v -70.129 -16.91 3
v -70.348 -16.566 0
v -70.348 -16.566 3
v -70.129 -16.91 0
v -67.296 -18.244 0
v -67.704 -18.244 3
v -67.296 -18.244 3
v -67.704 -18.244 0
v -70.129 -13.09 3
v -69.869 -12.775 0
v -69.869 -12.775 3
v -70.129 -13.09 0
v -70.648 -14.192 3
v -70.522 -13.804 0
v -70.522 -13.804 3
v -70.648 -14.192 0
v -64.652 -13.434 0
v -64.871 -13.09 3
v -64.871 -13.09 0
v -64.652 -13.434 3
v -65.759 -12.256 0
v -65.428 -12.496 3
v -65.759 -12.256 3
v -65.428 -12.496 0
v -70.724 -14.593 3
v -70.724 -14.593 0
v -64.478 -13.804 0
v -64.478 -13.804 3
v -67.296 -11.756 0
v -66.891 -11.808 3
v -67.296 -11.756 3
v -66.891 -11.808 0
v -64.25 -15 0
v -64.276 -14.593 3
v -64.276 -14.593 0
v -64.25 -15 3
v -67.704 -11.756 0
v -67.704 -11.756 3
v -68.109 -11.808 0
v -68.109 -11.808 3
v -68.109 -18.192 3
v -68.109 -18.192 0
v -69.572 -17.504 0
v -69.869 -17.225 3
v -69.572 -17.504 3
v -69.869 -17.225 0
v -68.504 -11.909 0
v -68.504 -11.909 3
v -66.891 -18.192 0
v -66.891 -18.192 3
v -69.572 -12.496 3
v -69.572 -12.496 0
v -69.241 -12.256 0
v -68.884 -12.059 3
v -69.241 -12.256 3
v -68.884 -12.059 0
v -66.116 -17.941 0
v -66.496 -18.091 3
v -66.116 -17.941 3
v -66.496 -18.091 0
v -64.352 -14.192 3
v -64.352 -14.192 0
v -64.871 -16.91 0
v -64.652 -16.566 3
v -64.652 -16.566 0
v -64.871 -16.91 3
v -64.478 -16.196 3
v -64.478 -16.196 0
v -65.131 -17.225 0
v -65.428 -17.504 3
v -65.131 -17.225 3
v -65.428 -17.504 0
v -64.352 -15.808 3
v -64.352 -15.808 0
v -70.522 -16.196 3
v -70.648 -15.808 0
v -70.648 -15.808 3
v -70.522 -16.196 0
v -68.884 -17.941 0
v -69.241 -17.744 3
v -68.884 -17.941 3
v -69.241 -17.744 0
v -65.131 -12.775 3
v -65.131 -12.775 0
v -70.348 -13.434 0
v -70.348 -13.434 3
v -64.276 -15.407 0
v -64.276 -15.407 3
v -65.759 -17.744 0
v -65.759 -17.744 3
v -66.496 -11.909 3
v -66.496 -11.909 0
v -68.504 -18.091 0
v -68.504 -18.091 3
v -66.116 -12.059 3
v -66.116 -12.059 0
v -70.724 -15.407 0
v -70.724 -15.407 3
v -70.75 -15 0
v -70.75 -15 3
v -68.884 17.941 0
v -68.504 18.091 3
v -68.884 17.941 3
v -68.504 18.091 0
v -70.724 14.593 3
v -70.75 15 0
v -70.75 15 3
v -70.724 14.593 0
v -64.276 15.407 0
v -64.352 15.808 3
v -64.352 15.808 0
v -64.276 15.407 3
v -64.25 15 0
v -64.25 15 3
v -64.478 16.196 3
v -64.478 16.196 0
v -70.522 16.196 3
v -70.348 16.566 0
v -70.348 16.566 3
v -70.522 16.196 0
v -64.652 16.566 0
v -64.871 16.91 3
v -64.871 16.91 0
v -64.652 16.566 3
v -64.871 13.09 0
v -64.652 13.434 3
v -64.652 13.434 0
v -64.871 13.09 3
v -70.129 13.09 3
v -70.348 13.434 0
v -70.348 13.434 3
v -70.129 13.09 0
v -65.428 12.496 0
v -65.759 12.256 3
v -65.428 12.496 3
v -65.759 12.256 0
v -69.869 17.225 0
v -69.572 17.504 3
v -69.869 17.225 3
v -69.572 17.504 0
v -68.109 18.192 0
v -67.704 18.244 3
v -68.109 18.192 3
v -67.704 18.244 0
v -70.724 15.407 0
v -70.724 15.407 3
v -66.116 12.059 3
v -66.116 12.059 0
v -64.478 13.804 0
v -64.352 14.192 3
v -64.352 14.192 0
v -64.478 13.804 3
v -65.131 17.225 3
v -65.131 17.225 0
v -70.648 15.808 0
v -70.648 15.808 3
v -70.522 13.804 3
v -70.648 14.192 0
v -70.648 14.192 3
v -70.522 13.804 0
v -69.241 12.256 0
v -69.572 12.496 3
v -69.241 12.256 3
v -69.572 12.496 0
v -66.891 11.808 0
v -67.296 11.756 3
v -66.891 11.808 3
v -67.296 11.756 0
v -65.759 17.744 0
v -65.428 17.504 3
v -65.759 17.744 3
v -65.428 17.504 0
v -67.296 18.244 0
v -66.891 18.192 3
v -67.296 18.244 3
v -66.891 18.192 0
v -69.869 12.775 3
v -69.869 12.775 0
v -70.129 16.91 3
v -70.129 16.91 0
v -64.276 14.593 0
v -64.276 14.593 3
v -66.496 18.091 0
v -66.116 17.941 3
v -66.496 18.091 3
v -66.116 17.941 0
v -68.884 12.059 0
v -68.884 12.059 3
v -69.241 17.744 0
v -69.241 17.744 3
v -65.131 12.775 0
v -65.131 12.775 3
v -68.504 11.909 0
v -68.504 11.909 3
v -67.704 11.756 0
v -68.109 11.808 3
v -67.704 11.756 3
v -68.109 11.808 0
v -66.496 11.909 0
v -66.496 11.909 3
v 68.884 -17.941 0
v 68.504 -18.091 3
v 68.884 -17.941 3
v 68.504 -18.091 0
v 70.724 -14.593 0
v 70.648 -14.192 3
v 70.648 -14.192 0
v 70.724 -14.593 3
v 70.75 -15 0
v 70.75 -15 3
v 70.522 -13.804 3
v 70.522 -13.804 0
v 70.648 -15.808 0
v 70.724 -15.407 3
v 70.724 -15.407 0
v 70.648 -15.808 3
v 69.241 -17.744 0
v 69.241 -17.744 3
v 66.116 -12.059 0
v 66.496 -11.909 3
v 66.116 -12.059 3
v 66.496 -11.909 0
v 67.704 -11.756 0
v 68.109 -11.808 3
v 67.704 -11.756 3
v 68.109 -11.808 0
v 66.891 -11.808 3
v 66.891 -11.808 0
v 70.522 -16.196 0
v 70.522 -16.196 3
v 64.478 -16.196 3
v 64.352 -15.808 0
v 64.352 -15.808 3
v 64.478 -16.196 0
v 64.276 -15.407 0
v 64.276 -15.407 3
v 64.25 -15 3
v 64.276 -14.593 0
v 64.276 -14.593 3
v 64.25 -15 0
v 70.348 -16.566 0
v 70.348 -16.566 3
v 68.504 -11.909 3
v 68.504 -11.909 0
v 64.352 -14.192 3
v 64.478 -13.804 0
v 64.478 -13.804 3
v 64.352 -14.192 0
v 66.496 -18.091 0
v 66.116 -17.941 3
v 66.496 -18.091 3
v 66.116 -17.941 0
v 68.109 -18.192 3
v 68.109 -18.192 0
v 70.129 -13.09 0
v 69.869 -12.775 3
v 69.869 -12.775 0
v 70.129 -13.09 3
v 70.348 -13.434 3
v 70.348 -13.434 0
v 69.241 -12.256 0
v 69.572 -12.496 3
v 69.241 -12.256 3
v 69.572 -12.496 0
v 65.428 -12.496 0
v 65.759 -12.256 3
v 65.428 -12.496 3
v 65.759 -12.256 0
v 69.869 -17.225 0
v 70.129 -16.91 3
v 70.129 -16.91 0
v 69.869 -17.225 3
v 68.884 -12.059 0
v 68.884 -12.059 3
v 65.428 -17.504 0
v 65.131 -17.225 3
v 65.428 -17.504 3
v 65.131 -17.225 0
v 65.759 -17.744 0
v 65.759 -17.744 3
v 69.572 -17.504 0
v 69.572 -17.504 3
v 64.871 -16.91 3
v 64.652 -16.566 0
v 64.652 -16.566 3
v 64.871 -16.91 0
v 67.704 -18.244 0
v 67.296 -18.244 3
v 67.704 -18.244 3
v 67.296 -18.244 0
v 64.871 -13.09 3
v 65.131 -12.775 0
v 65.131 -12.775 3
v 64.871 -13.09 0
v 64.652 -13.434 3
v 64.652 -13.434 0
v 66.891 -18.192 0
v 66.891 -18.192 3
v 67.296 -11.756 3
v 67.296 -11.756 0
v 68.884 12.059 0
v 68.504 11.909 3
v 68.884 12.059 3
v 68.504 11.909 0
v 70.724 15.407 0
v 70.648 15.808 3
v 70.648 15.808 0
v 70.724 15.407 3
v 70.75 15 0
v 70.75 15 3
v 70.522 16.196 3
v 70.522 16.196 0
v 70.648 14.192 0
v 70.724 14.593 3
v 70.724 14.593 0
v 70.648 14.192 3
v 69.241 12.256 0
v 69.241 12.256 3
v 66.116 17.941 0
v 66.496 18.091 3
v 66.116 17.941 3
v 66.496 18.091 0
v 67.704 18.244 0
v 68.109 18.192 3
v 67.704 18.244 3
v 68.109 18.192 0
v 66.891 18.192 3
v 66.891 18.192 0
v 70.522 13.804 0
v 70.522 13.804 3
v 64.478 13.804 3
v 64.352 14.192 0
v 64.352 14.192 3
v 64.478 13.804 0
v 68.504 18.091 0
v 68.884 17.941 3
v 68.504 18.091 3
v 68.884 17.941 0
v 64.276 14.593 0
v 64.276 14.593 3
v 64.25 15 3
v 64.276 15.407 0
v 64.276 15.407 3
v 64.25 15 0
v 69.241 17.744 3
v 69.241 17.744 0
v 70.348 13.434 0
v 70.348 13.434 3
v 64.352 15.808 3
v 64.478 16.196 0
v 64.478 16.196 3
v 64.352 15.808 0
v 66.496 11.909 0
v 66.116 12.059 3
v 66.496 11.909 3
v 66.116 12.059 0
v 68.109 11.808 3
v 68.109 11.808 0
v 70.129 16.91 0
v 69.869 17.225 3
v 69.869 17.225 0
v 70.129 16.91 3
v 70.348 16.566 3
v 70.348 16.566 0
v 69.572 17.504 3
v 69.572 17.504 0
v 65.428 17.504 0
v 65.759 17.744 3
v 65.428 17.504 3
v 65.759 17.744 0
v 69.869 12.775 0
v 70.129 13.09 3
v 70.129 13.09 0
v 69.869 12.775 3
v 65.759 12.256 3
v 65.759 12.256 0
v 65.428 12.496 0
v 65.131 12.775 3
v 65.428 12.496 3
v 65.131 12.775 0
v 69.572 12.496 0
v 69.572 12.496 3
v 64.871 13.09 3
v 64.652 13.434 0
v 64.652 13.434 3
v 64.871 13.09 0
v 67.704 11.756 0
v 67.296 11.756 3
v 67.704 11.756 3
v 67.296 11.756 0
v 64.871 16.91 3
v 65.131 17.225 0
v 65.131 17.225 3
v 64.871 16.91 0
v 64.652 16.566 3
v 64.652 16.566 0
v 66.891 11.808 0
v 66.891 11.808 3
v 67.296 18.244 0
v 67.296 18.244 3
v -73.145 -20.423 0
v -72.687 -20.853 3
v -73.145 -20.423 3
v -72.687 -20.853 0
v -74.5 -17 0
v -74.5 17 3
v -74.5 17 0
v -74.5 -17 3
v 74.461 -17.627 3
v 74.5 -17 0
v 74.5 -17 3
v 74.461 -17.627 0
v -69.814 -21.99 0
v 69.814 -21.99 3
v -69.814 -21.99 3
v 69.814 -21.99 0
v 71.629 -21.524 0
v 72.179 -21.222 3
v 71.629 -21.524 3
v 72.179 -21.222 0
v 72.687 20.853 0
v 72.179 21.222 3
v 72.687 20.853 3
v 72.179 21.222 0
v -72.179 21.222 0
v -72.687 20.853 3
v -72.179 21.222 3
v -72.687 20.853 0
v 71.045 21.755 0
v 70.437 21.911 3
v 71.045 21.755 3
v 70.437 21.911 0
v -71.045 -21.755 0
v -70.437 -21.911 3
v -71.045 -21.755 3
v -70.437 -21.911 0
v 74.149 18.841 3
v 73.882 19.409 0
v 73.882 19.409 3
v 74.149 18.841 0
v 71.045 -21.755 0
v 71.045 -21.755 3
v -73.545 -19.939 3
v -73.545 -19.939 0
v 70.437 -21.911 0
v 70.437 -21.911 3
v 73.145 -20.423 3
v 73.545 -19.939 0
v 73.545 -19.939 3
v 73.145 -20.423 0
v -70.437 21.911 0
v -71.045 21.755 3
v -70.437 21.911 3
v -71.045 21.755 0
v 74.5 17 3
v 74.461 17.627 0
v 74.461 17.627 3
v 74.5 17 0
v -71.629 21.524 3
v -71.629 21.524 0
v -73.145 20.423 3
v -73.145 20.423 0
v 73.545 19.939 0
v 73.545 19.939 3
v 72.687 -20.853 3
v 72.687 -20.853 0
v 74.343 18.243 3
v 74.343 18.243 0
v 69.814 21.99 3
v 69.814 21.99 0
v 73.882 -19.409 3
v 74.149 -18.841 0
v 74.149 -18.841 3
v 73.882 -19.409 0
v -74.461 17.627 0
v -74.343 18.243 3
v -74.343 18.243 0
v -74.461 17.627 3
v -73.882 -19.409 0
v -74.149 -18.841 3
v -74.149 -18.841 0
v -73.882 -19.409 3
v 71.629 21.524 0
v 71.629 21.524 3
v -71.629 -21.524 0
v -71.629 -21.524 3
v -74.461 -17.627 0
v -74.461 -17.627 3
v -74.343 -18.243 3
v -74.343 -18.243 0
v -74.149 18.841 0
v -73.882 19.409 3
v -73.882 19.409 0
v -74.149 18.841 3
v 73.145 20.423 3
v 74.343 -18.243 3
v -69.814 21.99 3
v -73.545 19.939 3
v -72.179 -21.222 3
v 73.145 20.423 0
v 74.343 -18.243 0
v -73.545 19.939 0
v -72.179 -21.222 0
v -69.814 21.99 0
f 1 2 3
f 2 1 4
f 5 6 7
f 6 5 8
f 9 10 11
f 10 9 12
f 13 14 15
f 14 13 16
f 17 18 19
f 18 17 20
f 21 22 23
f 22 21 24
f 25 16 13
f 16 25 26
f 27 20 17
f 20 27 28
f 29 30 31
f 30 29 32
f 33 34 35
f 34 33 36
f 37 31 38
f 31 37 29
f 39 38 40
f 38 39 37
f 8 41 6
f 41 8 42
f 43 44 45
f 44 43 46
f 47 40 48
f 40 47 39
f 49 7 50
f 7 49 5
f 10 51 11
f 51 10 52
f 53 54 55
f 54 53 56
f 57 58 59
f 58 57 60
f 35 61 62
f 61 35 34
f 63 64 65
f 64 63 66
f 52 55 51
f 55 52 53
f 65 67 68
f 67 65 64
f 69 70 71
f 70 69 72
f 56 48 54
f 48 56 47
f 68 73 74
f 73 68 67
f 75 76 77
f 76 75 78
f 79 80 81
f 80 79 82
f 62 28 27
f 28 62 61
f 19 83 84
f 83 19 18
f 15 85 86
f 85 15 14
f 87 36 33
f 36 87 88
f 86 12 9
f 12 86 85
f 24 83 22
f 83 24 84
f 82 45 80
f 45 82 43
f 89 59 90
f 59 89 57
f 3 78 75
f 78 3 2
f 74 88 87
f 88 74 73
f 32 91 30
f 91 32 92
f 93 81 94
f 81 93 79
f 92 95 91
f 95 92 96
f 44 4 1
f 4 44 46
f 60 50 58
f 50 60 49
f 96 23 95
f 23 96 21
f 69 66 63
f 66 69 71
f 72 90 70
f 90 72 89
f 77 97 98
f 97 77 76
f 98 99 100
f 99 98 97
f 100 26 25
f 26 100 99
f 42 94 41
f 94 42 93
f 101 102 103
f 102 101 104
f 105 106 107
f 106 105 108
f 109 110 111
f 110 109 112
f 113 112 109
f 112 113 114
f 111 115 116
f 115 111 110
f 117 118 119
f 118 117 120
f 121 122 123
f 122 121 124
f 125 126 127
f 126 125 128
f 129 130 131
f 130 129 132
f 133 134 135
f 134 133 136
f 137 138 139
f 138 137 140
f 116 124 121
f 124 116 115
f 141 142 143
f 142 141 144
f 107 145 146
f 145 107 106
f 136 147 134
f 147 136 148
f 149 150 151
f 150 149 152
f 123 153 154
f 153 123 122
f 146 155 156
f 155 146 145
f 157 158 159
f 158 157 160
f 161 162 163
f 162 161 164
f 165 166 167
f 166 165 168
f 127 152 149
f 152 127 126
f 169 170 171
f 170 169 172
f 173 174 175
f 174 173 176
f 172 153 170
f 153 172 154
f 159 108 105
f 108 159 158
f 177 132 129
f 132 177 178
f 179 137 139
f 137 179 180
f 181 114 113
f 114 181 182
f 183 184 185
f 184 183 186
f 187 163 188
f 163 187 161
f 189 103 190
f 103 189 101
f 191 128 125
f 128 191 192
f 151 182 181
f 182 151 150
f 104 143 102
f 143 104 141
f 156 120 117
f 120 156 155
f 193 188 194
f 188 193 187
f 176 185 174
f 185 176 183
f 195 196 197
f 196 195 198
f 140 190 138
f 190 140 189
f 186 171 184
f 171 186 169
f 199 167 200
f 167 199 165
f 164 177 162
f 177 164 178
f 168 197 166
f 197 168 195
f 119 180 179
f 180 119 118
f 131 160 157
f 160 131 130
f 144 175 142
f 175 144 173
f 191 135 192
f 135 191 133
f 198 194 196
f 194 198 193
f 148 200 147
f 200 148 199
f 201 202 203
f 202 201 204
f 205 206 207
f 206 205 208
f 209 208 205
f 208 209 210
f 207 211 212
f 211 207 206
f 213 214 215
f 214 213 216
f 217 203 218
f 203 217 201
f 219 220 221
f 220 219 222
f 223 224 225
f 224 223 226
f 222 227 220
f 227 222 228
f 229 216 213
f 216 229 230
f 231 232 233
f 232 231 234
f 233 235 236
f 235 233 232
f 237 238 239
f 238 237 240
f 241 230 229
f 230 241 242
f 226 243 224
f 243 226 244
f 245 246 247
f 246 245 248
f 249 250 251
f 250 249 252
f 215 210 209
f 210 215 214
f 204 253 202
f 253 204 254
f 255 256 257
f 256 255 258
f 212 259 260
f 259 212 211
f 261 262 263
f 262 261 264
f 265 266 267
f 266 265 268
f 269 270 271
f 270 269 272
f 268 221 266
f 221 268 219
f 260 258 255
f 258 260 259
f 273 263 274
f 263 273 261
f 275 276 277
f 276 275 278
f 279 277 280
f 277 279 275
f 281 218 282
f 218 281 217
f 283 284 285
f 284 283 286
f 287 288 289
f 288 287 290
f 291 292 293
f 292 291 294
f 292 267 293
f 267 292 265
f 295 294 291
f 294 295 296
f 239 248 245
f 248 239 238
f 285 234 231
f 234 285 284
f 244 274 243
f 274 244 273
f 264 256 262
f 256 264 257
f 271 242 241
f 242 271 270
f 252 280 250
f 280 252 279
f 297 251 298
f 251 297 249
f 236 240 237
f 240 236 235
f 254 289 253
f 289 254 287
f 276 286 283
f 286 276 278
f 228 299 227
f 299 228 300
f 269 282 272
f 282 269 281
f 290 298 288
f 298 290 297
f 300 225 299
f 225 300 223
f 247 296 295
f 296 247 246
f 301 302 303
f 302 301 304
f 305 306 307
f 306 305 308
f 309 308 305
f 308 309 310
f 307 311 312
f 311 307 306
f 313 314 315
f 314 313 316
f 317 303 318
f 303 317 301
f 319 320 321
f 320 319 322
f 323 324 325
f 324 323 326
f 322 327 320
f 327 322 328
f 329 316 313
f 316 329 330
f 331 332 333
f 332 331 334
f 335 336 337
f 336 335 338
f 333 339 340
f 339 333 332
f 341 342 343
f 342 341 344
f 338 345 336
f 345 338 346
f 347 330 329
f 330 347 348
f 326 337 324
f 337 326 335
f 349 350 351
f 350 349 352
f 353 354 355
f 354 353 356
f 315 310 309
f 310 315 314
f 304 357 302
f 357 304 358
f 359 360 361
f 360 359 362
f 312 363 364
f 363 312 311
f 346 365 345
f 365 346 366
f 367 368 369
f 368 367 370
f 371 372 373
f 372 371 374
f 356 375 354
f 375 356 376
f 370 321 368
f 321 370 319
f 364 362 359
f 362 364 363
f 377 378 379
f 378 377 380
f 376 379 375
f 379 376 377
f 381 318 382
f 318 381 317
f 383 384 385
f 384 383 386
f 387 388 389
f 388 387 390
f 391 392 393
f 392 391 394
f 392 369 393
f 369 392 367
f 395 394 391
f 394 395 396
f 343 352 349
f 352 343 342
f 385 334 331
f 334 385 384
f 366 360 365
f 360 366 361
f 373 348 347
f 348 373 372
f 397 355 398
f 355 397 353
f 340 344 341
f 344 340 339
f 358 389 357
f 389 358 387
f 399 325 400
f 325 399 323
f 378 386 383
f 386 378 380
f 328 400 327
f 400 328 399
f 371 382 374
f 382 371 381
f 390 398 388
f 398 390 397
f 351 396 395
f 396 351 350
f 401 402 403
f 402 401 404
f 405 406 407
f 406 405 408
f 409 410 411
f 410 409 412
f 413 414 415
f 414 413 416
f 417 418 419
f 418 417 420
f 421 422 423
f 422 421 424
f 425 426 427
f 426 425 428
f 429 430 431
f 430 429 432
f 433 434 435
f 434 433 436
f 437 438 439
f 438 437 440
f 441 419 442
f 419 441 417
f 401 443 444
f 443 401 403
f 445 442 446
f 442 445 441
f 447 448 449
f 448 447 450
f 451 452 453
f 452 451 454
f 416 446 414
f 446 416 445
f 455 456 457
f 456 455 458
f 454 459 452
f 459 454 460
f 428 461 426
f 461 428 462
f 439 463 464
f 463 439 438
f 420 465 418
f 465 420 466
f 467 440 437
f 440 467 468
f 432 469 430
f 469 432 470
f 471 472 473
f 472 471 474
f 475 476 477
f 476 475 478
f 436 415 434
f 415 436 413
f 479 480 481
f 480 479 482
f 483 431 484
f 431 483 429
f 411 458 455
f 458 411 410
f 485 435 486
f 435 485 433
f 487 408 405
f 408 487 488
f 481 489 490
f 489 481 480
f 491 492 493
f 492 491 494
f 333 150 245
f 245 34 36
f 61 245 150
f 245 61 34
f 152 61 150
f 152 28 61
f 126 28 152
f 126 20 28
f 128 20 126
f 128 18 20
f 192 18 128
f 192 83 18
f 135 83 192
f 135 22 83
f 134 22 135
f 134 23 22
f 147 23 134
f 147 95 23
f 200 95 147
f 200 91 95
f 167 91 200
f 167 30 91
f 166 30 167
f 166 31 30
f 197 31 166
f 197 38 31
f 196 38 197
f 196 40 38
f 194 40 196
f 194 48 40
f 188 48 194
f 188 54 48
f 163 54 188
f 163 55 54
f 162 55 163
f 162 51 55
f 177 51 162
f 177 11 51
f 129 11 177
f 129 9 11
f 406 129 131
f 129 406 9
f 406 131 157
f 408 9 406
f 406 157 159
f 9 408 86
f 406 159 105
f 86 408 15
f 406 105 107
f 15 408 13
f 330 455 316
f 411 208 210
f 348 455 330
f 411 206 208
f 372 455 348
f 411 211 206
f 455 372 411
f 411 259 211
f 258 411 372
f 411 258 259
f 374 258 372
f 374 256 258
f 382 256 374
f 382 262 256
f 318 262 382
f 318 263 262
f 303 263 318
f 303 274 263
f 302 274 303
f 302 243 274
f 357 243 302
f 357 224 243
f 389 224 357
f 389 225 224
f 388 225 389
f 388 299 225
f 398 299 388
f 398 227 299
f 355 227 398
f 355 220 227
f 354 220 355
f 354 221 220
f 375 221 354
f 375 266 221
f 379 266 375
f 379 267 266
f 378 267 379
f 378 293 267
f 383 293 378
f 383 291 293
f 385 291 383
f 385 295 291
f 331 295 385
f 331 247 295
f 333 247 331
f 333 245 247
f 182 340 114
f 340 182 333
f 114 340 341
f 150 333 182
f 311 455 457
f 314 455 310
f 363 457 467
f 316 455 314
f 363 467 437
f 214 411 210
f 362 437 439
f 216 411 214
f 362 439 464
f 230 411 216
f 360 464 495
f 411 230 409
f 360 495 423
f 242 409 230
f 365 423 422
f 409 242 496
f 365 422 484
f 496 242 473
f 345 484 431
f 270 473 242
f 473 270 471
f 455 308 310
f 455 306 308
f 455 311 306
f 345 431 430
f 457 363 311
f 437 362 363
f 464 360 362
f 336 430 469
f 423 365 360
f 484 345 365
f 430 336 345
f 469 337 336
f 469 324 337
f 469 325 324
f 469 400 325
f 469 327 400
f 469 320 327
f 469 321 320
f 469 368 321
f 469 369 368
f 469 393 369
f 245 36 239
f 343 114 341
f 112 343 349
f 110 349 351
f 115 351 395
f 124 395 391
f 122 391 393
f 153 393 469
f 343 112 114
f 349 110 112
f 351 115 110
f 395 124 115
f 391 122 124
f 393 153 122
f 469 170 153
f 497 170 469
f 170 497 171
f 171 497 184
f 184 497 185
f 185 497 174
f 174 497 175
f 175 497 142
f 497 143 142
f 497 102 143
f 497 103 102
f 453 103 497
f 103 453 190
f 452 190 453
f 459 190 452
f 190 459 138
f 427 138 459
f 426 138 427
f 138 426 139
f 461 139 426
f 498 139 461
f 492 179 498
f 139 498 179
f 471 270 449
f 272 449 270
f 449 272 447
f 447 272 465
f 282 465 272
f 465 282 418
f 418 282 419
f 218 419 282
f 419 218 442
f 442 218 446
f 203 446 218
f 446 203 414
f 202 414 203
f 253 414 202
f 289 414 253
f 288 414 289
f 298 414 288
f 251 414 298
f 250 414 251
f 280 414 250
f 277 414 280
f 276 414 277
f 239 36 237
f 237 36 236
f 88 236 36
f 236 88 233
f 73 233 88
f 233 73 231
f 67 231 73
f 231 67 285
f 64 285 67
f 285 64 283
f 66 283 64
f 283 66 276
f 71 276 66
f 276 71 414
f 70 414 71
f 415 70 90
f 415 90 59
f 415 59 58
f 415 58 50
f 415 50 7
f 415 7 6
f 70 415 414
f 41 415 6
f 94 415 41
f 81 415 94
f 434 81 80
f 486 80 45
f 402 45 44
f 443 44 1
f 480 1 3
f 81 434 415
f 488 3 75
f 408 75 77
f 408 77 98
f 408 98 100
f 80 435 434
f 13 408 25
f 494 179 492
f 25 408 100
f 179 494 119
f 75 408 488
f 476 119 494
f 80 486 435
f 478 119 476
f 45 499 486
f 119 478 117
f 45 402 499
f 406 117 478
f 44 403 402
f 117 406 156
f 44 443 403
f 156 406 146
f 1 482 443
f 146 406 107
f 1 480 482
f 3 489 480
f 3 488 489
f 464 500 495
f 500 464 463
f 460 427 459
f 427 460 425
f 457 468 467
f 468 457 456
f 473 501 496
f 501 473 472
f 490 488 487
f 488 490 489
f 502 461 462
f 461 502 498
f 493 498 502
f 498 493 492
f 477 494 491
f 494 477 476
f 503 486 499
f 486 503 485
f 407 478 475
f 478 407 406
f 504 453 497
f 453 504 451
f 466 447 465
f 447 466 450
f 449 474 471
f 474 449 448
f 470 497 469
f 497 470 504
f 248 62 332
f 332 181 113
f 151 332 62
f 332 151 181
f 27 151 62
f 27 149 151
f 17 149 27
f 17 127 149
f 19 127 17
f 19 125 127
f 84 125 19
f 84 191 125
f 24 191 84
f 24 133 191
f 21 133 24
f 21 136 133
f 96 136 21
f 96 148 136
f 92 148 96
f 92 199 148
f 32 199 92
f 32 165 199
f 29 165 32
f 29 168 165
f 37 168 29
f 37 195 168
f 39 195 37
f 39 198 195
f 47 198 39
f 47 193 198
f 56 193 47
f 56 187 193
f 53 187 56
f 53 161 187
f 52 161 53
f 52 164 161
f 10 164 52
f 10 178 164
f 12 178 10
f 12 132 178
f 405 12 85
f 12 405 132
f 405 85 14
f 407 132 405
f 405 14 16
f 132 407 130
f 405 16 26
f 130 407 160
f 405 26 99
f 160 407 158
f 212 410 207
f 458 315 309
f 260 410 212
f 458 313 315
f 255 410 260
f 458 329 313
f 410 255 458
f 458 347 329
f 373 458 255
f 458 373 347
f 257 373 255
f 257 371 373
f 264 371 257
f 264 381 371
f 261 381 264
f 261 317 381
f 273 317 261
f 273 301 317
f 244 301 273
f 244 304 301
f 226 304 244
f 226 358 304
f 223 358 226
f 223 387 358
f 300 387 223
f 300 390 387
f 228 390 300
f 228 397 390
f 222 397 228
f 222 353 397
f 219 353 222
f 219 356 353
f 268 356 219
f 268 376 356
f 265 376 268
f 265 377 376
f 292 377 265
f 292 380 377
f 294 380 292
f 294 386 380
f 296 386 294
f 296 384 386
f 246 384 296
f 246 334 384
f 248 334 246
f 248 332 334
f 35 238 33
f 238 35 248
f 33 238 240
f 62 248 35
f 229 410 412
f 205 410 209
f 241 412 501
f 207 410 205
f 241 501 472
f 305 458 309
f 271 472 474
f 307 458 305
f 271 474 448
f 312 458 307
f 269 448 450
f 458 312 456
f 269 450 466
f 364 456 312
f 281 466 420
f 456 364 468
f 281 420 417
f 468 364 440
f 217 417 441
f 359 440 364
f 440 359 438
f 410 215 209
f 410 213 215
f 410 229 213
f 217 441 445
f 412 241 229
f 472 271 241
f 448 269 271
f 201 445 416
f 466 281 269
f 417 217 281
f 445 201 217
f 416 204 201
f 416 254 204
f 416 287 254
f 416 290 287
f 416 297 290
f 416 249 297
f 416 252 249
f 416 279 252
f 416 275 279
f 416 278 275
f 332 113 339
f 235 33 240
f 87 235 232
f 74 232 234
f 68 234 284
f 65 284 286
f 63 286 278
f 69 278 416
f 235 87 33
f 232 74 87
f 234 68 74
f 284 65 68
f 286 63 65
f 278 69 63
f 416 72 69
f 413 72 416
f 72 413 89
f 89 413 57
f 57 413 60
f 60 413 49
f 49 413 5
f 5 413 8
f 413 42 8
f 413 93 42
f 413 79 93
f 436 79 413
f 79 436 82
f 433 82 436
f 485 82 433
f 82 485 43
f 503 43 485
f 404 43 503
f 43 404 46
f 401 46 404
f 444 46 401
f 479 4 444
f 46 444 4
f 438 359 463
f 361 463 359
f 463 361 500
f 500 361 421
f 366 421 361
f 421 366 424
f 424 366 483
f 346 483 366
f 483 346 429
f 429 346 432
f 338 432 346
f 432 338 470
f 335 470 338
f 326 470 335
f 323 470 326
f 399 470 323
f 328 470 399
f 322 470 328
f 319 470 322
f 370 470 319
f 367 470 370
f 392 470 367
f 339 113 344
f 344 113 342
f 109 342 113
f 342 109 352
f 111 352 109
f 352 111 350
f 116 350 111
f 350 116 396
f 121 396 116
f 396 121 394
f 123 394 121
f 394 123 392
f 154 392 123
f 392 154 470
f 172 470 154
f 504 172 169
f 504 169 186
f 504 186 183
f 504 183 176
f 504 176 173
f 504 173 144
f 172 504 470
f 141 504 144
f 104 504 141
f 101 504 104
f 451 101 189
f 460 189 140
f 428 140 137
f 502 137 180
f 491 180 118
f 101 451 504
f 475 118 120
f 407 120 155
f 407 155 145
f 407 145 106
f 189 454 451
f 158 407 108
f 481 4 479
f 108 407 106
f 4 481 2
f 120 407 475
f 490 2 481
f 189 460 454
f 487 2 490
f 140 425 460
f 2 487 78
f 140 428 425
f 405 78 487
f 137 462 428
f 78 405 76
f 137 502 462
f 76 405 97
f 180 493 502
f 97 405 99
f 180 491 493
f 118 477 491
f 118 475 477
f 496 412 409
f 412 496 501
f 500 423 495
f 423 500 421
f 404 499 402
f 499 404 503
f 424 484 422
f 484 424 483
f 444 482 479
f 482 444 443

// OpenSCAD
$fn = 50;


difference() {
	union() {
		hull() {
			translate(v = [-69.5000000000, 17.0000000000, 0]) {
				cylinder(h = 3, r = 5);
			}
			translate(v = [69.5000000000, 17.0000000000, 0]) {
				cylinder(h = 3, r = 5);
			}
			translate(v = [-69.5000000000, -17.0000000000, 0]) {
				cylinder(h = 3, r = 5);
			}
			translate(v = [69.5000000000, -17.0000000000, 0]) {
				cylinder(h = 3, r = 5);
			}
		}
	}
	union() {
		translate(v = [-67.5000000000, -15.0000000000, -100.0000000000]) {
			cylinder(h = 200, r = 3.2500000000);
		}
		translate(v = [-67.5000000000, 15.0000000000, -100.0000000000]) {
			cylinder(h = 200, r = 3.2500000000);
		}
		translate(v = [67.5000000000, -15.0000000000, -100.0000000000]) {
			cylinder(h = 200, r = 3.2500000000);
		}
		translate(v = [67.5000000000, 15.0000000000, -100.0000000000]) {
			cylinder(h = 200, r = 3.2500000000);
		}
	}
}
